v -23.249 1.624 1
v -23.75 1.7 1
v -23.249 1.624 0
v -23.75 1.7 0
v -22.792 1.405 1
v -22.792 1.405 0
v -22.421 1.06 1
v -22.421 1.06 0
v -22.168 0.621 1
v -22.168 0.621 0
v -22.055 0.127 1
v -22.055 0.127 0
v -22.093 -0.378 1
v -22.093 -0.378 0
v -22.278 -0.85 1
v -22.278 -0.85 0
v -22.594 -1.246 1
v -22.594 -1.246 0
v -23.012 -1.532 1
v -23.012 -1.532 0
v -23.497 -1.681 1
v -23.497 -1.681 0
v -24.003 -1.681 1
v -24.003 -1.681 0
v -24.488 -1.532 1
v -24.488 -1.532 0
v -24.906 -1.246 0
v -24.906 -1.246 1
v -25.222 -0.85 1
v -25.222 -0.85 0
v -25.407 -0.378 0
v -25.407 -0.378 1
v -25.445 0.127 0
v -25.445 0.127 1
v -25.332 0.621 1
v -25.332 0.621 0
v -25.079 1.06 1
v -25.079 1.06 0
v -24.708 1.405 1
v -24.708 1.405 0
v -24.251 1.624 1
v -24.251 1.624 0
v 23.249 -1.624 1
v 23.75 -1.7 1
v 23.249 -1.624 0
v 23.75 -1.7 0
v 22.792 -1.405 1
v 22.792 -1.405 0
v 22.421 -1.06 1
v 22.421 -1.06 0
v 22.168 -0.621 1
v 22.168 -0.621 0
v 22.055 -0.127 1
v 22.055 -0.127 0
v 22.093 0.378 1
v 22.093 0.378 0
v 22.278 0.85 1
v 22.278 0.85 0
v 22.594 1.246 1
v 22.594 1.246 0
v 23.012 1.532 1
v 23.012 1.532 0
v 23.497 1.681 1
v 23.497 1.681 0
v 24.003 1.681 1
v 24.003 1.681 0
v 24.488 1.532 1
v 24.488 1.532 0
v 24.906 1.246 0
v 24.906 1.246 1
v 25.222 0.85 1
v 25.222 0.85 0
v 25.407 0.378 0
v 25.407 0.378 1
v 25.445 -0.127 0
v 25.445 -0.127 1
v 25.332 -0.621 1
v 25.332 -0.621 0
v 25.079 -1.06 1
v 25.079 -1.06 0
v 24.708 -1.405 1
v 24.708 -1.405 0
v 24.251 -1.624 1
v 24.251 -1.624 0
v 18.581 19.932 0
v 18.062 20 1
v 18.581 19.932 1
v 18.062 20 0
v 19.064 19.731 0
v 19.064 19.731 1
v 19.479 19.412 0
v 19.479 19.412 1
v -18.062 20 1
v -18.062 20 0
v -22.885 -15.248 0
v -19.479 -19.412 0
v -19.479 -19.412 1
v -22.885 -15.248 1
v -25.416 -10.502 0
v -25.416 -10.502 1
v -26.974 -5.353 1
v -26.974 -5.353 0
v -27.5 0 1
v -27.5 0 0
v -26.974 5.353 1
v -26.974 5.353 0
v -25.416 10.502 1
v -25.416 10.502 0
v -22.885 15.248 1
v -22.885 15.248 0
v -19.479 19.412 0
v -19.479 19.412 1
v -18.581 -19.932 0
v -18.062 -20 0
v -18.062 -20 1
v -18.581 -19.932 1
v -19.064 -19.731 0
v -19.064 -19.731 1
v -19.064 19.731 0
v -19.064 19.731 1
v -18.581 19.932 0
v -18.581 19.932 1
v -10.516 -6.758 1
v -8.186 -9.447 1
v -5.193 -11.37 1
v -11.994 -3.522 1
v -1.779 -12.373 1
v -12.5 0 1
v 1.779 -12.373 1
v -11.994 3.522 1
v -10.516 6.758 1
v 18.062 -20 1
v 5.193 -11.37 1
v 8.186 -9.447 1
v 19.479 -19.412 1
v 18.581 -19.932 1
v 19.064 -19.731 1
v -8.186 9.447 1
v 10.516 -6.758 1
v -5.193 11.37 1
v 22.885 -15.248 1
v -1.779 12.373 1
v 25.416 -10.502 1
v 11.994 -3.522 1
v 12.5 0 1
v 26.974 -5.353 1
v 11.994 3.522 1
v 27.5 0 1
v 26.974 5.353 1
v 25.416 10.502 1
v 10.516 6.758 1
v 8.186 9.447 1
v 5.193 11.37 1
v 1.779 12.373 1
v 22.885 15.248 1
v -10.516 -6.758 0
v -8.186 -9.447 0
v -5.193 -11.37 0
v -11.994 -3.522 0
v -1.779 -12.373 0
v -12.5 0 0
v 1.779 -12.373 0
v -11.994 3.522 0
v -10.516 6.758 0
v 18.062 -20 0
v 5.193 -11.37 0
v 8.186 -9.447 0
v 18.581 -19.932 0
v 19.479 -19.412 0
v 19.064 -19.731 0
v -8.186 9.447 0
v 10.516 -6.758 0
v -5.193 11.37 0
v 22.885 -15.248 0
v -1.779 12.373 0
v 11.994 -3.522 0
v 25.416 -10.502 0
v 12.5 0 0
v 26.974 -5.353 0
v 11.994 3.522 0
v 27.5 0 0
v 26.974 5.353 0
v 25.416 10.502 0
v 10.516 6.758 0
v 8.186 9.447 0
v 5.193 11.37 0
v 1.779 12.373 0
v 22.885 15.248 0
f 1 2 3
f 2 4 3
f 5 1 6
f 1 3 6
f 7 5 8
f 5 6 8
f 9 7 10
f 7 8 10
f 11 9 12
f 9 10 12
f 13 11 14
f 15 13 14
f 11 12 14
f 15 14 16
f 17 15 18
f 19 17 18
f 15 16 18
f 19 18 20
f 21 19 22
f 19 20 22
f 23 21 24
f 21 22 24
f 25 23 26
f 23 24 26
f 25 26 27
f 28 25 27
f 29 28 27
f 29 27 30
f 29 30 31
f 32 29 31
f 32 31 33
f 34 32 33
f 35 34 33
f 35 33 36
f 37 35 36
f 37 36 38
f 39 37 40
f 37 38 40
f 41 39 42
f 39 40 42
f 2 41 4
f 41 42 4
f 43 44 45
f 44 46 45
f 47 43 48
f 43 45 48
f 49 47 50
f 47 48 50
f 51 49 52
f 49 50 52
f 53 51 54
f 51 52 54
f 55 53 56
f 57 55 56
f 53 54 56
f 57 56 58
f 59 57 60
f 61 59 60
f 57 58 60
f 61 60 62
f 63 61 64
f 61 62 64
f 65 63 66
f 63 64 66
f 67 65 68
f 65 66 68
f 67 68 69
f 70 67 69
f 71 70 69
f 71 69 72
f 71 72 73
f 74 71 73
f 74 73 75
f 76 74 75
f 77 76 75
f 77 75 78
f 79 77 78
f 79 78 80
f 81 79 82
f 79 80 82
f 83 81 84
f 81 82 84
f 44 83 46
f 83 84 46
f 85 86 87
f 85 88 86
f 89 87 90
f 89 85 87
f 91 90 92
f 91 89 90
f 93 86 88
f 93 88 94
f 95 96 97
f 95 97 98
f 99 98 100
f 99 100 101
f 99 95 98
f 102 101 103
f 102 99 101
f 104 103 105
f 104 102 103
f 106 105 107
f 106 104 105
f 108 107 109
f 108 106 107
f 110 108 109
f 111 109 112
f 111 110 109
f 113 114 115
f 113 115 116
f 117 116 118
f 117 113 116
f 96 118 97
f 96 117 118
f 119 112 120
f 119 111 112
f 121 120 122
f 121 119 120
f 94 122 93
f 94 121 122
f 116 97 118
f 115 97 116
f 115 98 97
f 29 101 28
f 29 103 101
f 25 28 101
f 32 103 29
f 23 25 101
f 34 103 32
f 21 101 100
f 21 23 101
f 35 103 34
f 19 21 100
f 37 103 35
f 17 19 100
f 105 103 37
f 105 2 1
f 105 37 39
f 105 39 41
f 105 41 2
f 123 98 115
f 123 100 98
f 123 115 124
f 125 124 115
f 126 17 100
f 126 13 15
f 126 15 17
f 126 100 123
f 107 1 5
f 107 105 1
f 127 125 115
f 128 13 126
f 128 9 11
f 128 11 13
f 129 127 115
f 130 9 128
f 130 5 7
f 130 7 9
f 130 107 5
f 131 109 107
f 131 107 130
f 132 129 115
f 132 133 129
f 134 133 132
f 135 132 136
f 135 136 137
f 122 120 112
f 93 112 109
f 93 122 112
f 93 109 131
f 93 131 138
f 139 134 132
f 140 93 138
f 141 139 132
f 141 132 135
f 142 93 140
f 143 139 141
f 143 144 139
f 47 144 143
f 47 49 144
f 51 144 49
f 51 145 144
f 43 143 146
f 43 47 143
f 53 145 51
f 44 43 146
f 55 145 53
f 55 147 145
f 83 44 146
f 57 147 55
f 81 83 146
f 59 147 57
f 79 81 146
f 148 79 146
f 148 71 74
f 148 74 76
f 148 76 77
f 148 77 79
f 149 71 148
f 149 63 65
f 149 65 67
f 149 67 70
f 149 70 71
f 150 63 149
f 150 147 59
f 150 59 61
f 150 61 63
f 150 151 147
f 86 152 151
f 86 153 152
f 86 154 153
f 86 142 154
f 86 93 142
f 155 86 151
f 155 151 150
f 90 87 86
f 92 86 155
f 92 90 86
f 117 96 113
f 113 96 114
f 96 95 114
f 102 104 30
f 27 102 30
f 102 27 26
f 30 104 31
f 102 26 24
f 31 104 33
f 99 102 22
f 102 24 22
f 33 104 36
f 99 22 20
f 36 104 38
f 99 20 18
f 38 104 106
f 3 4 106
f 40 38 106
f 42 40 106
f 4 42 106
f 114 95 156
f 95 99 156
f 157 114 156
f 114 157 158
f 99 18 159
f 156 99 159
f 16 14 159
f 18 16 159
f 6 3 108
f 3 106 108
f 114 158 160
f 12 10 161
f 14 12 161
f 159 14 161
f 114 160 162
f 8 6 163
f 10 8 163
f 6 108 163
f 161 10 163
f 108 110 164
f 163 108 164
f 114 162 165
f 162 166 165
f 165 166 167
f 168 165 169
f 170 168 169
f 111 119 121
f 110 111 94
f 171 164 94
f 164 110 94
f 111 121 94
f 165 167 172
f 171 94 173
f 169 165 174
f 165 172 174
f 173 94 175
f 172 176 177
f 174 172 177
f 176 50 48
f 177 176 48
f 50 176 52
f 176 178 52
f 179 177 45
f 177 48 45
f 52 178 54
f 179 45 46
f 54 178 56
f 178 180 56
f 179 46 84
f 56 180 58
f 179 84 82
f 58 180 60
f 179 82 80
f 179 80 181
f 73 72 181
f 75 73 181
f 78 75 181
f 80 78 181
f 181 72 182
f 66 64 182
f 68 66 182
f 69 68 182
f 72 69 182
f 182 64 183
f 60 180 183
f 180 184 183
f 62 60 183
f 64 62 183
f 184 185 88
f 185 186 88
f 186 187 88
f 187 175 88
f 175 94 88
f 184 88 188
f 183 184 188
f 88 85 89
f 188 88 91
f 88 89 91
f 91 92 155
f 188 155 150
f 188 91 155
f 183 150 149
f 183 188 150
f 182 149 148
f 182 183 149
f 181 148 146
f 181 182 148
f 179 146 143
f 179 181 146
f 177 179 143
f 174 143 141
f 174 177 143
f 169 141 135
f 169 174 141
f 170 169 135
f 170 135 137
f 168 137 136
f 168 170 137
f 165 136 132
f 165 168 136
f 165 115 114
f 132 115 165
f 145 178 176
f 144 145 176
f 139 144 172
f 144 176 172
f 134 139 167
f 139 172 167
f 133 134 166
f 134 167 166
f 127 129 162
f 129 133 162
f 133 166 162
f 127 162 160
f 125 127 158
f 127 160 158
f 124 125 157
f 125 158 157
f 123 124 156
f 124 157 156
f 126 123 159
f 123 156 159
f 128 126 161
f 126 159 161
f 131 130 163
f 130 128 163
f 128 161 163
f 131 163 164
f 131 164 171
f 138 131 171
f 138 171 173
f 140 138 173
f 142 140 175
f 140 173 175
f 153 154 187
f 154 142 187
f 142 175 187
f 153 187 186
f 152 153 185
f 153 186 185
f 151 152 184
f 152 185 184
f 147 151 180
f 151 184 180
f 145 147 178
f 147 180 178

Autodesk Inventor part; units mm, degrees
ref_plane "YZ Plane" through (0, 0, 0) normal (1, 0, 0) x (0, 1, 0)
ref_plane "XZ Plane" through (0, 0, 0) normal (0, 1, 0) x (-1, 0, 0)
ref_plane "XY Plane" through (0, 0, 0) normal (0, 0, 1) x (1, 0, 0)
sketch "Sketch1" plane through (0, 0, 0) normal (0, 0, 1) x (1, 0, 0)
  circle A0 centre (0, 0) radius 12.5
  circle A1 centre (0, 0) radius 27.5
  dimension "d2" = 25
  dimension "d3" = 55
extrude "Extrusion1" add sketch "Sketch1" along normal blind 1
sketch "Sketch2" plane through (0, 0, 1) normal (0, 0, 1) x (1, 0, 0)
  circle A0 centre (0, 0) radius 23.75 construction
  point P0 (23.75, 0)
  dimension "d4" = 47.5
hole "Hole1" at (23.75, 0, 1) direction (0, 0, -1) diameter 3.4 end through all
pattern_circular "Circular Pattern1" count 4 over 360 about axis through (0, 0, 0) along (0, 0, 1) of "Hole1"
sketch "Sketch3" plane through (0, 0, 1) normal (0, 0, 1) x (1, 0, 0)
  line L0 (-30, 30) -> (30, 30)
  line L1 (30, 30) -> (30, 20)
  line L2 (30, 20) -> (-30, 20)
  line L3 (-30, 20) -> (-30, 30)
  point P0 (0, 0)
  point P1 (0, 20)
  dimension "d15" = 20
  dimension "d16" = 60
  dimension "d17" = 10
extrude "Extrusion2" cut sketch "Sketch3" against normal through all
mirror "Mirror1" about plane through (0, 0, 0) normal (0, 1, 0) of "Extrusion2"
fillet "Fillet2" radius 2 4 edges at (-18.8746, 20, 0.5) (18.8746, 20, 0.5) (-18.8746, -20, 0.5) (18.8746, -20, 0.5)
properties part number "Plasma Box Slit" material "Stainless Steel"
